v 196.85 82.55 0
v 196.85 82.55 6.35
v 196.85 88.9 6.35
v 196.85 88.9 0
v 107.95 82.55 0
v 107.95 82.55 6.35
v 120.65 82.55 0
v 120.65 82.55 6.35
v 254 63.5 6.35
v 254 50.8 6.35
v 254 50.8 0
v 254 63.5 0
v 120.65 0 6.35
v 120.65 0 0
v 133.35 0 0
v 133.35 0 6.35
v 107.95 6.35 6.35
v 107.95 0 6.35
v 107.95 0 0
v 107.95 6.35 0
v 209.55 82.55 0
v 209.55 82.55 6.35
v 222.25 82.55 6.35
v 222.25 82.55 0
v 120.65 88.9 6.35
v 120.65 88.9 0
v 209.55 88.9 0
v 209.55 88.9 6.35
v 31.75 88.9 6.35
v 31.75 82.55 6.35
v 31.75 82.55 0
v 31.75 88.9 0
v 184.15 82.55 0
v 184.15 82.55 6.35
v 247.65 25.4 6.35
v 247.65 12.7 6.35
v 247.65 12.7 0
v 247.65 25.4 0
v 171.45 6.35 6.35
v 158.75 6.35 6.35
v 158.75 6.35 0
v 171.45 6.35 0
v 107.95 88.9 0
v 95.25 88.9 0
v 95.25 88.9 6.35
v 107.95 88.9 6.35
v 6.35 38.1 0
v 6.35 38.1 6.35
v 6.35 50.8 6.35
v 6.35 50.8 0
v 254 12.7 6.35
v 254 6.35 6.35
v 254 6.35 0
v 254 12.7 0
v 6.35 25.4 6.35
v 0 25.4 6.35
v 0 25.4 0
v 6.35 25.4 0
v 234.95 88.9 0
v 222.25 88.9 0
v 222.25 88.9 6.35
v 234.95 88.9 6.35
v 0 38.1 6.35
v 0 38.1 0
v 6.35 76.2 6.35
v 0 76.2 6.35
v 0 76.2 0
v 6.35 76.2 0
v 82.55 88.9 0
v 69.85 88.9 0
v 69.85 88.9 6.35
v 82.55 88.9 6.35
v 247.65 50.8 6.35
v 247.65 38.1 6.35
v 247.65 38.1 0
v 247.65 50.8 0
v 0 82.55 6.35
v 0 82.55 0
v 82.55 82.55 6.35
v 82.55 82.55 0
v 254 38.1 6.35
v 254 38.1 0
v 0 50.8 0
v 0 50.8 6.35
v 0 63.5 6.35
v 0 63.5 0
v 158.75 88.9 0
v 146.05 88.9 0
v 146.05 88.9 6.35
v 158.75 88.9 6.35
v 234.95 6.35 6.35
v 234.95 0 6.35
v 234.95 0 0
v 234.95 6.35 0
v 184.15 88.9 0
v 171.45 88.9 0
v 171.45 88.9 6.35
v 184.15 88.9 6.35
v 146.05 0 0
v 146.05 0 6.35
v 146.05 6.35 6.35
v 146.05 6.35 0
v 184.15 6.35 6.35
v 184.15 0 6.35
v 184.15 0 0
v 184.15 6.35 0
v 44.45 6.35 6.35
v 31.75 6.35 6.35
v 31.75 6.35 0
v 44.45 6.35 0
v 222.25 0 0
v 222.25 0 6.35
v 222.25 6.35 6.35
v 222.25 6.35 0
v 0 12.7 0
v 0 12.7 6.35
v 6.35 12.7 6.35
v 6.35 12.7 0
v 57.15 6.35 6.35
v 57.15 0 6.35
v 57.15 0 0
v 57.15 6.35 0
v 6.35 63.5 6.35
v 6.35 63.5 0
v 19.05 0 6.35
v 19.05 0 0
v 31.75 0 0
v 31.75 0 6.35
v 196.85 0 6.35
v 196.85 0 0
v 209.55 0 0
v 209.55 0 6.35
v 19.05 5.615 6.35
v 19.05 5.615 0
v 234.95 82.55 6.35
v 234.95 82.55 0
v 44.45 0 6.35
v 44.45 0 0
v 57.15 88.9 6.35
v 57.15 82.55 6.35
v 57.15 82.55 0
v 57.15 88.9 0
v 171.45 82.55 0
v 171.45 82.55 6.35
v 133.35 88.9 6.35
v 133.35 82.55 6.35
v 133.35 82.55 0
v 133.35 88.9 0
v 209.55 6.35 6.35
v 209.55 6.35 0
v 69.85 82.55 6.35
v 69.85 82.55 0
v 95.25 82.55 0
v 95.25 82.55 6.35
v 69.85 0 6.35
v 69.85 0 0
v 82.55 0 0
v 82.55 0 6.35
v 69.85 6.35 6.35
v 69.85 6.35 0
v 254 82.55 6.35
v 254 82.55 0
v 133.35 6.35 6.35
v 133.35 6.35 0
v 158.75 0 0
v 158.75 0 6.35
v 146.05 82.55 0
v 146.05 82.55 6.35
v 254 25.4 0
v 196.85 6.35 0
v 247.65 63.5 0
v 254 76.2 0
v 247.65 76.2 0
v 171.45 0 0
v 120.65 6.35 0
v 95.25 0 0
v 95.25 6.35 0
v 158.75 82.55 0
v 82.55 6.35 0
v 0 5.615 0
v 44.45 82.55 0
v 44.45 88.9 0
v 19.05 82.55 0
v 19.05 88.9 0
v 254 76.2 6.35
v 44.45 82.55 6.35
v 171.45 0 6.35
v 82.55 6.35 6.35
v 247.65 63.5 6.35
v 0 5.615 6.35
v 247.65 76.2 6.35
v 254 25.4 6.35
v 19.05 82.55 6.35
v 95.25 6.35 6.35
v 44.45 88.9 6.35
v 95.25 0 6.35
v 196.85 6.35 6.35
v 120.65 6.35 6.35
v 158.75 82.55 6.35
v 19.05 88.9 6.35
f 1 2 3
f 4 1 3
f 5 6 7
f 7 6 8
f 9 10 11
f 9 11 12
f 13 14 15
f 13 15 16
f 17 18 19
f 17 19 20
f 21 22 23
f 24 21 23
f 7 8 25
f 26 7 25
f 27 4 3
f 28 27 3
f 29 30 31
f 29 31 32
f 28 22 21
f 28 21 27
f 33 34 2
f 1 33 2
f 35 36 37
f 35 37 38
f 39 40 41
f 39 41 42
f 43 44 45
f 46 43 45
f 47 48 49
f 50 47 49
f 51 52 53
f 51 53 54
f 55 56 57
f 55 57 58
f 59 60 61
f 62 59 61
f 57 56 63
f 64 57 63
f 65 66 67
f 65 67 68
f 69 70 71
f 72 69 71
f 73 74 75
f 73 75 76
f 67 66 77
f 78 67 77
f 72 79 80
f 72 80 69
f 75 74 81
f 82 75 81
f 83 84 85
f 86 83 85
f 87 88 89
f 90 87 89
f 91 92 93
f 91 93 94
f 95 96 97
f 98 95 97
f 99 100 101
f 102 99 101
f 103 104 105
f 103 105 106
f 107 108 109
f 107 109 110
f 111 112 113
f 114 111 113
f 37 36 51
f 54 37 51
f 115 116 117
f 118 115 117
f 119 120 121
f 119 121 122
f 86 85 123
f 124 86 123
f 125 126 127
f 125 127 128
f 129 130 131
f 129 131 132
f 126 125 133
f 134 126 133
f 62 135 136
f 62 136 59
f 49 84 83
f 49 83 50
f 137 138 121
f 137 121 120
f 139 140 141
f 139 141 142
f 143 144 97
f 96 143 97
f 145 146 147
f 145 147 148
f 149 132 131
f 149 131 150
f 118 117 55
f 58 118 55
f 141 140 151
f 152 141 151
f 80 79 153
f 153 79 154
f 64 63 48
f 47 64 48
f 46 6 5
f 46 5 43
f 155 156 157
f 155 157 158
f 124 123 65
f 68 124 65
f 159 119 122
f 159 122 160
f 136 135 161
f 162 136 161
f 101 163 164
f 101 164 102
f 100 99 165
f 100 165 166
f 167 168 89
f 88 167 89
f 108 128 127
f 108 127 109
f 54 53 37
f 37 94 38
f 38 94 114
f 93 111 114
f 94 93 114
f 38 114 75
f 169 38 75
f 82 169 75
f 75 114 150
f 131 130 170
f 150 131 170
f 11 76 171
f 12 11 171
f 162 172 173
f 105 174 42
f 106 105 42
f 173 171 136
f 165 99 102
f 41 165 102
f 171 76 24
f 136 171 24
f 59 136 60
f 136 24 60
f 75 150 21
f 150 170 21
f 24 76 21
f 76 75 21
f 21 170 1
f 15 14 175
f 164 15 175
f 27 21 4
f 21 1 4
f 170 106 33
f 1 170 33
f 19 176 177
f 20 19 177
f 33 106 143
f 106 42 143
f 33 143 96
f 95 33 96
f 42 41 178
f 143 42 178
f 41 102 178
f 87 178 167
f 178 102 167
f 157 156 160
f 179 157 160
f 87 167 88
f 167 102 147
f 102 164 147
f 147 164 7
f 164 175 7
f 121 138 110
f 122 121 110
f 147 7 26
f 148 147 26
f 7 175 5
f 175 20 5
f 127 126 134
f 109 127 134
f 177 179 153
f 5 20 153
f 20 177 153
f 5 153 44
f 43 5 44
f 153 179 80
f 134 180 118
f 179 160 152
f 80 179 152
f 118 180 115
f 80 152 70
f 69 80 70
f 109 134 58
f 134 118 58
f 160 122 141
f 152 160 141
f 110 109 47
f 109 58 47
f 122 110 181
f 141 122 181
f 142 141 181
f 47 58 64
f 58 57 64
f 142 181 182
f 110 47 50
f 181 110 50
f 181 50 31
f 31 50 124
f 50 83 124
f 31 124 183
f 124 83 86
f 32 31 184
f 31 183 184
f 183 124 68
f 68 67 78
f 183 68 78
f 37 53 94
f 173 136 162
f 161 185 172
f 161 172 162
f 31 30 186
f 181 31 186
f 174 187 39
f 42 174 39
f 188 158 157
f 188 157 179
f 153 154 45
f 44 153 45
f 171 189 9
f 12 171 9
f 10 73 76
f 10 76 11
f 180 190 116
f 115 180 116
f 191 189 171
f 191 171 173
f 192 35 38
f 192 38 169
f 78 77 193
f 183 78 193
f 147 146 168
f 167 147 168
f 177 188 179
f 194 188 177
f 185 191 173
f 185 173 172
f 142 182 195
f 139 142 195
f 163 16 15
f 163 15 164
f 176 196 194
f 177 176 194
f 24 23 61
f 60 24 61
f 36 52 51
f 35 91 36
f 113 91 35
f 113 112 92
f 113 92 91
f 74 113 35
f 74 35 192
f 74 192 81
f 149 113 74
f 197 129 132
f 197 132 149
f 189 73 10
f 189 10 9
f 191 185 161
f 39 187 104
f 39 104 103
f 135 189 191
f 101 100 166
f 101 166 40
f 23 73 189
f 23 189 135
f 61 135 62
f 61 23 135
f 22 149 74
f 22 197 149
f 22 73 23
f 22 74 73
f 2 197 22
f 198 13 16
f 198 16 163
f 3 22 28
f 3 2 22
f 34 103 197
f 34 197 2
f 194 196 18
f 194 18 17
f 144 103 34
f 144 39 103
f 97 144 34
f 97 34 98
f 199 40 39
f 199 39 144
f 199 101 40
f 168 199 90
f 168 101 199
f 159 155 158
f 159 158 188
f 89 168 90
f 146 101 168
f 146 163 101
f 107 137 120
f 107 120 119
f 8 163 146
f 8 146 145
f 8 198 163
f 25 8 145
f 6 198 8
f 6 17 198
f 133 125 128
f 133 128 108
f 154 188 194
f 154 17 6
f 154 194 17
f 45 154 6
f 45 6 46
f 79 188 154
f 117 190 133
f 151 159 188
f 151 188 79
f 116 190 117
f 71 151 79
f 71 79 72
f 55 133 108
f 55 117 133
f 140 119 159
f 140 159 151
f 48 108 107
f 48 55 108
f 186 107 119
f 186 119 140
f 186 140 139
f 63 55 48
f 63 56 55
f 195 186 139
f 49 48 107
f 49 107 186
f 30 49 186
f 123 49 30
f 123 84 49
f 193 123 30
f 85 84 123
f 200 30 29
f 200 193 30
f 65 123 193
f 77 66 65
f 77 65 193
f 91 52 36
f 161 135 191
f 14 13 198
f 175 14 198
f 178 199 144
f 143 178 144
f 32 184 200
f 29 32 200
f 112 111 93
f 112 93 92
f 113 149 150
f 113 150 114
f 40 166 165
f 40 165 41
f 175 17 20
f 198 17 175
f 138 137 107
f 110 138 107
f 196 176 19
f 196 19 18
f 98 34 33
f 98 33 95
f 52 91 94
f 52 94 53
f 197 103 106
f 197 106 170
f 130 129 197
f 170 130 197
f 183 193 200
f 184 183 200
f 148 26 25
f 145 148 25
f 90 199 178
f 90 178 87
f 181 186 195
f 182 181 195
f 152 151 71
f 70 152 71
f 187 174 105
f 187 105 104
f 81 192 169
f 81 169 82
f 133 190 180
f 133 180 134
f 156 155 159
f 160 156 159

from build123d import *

# Parameters (mm, degrees)
SKETCH2_W           = 88.9
SKETCH2_H           = 6.35
BOSS_EXTRUDE1_DEPTH = 254
SKETCH3_W           = 6.35
SKETCH3_H           = 12.7
SKETCH3_W_2         = 12.7
SKETCH3_H_2         = 6.35
SKETCH3_W_3         = 19.05
SKETCH3_H_3         = 5.615455356
CUT_EXTRUDE1_DEPTH  = 254


with BuildPart() as part:
    # Sketch2 → Boss-Extrude1 (new body)
    with BuildSketch(Plane.YZ):
        with Locations((44.45, 3.175)):
            Rectangle(SKETCH2_W, SKETCH2_H)
    extrude(amount=BOSS_EXTRUDE1_DEPTH)

    # Sketch3 → Cut-Extrude1 (cut)
    with BuildSketch(Plane.XY.offset(6.35)):
        with Locations((3.175, 19.05)):
            Rectangle(SKETCH3_W, SKETCH3_H)
        with Locations((250.825, 19.05)):
            Rectangle(SKETCH3_W, SKETCH3_H)
        with Locations((3.175, 44.45)):
            Rectangle(SKETCH3_W, SKETCH3_H)
        with Locations((3.175, 69.85)):
            Rectangle(SKETCH3_W, SKETCH3_H)
        with Locations((250.825, 44.45)):
            Rectangle(SKETCH3_W, SKETCH3_H)
        with Locations((250.825, 69.85)):
            Rectangle(SKETCH3_W, SKETCH3_H)
        with Locations((88.9, 3.175)):
            Rectangle(SKETCH3_W_2, SKETCH3_H_2)
        with Locations((63.5, 3.175)):
            Rectangle(SKETCH3_W_2, SKETCH3_H_2)
        with Locations((114.3, 3.175)):
            Rectangle(SKETCH3_W_2, SKETCH3_H_2)
        with Locations((139.7, 3.175)):
            Rectangle(SKETCH3_W_2, SKETCH3_H_2)
        with Locations((165.1, 3.175)):
            Rectangle(SKETCH3_W_2, SKETCH3_H_2)
        with Locations((190.5, 3.175)):
            Rectangle(SKETCH3_W_2, SKETCH3_H_2)
        with Locations((215.9, 3.175)):
            Rectangle(SKETCH3_W_2, SKETCH3_H_2)
        with Locations((244.475, 3.175)):
            Rectangle(SKETCH3_W_3, SKETCH3_H_2)
        with Locations((88.9, 85.725)):
            Rectangle(SKETCH3_W_2, SKETCH3_H_2)
        with Locations((63.5, 85.725)):
            Rectangle(SKETCH3_W_2, SKETCH3_H_2)
        with Locations((114.3, 85.725)):
            Rectangle(SKETCH3_W_2, SKETCH3_H_2)
        with Locations((139.7, 85.725)):
            Rectangle(SKETCH3_W_2, SKETCH3_H_2)
        with Locations((165.1, 85.725)):
            Rectangle(SKETCH3_W_2, SKETCH3_H_2)
        with Locations((190.5, 85.725)):
            Rectangle(SKETCH3_W_2, SKETCH3_H_2)
        with Locations((215.9, 85.725)):
            Rectangle(SKETCH3_W_2, SKETCH3_H_2)
        with Locations((244.475, 85.725)):
            Rectangle(SKETCH3_W_3, SKETCH3_H_2)
        with Locations((38.1, 85.725)):
            Rectangle(SKETCH3_W_2, SKETCH3_H_2)
        with Locations((9.525, 85.725)):
            Rectangle(SKETCH3_W_3, SKETCH3_H_2)
        with Locations((9.525, 2.807727678)):
            Rectangle(SKETCH3_W_3, SKETCH3_H_3)
        with Locations((38.1, 3.175)):
            Rectangle(SKETCH3_W_2, SKETCH3_H_2)
    extrude(amount=-CUT_EXTRUDE1_DEPTH, mode=Mode.SUBTRACT)


solid = part.part
